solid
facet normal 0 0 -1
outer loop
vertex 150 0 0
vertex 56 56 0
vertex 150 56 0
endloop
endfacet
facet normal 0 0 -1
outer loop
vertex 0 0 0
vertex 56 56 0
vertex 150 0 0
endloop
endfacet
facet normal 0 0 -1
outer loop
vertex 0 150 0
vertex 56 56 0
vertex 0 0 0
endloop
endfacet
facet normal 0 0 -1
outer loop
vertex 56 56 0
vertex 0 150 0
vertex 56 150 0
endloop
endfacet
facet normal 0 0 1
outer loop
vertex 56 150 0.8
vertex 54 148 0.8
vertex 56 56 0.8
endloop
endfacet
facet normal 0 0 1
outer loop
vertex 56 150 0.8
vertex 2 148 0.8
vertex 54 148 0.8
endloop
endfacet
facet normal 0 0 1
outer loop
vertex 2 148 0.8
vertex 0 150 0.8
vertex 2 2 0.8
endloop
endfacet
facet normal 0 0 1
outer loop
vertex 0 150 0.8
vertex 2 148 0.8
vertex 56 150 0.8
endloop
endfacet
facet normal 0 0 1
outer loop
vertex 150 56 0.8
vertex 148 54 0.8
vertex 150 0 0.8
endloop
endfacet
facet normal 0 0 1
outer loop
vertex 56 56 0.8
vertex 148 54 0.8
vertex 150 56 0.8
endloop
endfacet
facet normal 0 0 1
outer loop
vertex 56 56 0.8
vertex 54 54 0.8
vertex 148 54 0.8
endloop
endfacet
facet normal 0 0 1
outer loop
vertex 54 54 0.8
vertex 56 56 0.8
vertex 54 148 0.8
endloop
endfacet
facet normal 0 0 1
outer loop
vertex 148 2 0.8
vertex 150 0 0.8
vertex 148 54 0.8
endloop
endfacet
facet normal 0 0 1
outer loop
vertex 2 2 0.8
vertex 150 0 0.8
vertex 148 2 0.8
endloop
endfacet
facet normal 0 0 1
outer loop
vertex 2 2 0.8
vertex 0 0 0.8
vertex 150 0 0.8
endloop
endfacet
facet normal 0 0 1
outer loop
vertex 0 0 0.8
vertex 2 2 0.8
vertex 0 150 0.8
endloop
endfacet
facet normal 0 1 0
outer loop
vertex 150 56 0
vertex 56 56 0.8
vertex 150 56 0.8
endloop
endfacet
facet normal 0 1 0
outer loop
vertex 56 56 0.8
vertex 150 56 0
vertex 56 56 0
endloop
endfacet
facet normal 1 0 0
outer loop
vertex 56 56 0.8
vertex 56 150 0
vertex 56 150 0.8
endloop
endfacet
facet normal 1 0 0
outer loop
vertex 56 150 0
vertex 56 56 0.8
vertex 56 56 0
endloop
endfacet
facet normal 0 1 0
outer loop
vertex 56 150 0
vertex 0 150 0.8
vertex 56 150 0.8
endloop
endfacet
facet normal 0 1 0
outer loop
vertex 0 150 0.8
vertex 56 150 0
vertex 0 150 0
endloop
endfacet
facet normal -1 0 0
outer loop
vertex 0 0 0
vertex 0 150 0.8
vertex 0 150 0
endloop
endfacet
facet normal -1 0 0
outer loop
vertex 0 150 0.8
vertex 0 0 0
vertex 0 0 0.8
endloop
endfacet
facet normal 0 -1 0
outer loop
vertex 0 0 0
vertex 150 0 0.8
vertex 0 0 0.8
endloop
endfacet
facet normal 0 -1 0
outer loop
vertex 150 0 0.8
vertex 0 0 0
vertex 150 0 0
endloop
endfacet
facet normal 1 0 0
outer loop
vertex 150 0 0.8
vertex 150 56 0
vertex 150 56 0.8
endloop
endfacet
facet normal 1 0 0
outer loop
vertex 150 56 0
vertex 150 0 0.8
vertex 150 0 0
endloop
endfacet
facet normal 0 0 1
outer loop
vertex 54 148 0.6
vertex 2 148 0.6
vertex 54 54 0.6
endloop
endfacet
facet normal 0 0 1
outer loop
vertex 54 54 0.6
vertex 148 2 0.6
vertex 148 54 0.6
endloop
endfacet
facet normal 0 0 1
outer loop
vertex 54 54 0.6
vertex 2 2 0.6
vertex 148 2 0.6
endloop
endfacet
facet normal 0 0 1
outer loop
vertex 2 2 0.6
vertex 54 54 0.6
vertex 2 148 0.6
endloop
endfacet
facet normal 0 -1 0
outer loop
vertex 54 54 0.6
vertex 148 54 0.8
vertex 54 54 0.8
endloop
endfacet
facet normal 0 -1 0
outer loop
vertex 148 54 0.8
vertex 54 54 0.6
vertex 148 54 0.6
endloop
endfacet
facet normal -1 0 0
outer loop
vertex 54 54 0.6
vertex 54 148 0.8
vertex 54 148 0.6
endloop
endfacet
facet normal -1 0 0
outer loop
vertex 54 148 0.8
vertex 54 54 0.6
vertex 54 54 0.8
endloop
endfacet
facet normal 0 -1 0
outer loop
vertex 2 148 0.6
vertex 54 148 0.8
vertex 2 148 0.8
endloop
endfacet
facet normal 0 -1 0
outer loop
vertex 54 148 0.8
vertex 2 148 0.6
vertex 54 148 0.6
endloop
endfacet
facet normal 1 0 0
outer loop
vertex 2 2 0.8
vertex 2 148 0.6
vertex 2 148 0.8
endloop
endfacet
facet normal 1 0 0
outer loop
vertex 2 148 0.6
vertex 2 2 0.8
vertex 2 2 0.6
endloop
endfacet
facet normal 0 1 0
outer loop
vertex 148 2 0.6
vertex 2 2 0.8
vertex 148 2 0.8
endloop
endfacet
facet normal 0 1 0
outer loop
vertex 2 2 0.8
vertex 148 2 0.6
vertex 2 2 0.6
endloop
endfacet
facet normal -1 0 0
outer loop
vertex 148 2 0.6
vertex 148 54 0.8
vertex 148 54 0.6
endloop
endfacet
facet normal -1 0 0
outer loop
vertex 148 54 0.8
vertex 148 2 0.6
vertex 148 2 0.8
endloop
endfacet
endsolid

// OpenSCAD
difference() {
	linear_extrude(height = 0.8000000000) {
		union() {
			square(size = [56, 150]);
			translate(v = [0, 56, 0]) {
				rotate(a = [0, 0, -90]) {
					square(size = [56, 150]);
				}
			}
		}
	}
	translate(v = [2, 2, 0.6000000000]) {
		linear_extrude(height = 0.2000000000) {
			union() {
				square(size = [52, 146]);
				translate(v = [0, 52, 0]) {
					rotate(a = [0, 0, -90]) {
						square(size = [52, 146]);
					}
				}
			}
		}
	}
}
